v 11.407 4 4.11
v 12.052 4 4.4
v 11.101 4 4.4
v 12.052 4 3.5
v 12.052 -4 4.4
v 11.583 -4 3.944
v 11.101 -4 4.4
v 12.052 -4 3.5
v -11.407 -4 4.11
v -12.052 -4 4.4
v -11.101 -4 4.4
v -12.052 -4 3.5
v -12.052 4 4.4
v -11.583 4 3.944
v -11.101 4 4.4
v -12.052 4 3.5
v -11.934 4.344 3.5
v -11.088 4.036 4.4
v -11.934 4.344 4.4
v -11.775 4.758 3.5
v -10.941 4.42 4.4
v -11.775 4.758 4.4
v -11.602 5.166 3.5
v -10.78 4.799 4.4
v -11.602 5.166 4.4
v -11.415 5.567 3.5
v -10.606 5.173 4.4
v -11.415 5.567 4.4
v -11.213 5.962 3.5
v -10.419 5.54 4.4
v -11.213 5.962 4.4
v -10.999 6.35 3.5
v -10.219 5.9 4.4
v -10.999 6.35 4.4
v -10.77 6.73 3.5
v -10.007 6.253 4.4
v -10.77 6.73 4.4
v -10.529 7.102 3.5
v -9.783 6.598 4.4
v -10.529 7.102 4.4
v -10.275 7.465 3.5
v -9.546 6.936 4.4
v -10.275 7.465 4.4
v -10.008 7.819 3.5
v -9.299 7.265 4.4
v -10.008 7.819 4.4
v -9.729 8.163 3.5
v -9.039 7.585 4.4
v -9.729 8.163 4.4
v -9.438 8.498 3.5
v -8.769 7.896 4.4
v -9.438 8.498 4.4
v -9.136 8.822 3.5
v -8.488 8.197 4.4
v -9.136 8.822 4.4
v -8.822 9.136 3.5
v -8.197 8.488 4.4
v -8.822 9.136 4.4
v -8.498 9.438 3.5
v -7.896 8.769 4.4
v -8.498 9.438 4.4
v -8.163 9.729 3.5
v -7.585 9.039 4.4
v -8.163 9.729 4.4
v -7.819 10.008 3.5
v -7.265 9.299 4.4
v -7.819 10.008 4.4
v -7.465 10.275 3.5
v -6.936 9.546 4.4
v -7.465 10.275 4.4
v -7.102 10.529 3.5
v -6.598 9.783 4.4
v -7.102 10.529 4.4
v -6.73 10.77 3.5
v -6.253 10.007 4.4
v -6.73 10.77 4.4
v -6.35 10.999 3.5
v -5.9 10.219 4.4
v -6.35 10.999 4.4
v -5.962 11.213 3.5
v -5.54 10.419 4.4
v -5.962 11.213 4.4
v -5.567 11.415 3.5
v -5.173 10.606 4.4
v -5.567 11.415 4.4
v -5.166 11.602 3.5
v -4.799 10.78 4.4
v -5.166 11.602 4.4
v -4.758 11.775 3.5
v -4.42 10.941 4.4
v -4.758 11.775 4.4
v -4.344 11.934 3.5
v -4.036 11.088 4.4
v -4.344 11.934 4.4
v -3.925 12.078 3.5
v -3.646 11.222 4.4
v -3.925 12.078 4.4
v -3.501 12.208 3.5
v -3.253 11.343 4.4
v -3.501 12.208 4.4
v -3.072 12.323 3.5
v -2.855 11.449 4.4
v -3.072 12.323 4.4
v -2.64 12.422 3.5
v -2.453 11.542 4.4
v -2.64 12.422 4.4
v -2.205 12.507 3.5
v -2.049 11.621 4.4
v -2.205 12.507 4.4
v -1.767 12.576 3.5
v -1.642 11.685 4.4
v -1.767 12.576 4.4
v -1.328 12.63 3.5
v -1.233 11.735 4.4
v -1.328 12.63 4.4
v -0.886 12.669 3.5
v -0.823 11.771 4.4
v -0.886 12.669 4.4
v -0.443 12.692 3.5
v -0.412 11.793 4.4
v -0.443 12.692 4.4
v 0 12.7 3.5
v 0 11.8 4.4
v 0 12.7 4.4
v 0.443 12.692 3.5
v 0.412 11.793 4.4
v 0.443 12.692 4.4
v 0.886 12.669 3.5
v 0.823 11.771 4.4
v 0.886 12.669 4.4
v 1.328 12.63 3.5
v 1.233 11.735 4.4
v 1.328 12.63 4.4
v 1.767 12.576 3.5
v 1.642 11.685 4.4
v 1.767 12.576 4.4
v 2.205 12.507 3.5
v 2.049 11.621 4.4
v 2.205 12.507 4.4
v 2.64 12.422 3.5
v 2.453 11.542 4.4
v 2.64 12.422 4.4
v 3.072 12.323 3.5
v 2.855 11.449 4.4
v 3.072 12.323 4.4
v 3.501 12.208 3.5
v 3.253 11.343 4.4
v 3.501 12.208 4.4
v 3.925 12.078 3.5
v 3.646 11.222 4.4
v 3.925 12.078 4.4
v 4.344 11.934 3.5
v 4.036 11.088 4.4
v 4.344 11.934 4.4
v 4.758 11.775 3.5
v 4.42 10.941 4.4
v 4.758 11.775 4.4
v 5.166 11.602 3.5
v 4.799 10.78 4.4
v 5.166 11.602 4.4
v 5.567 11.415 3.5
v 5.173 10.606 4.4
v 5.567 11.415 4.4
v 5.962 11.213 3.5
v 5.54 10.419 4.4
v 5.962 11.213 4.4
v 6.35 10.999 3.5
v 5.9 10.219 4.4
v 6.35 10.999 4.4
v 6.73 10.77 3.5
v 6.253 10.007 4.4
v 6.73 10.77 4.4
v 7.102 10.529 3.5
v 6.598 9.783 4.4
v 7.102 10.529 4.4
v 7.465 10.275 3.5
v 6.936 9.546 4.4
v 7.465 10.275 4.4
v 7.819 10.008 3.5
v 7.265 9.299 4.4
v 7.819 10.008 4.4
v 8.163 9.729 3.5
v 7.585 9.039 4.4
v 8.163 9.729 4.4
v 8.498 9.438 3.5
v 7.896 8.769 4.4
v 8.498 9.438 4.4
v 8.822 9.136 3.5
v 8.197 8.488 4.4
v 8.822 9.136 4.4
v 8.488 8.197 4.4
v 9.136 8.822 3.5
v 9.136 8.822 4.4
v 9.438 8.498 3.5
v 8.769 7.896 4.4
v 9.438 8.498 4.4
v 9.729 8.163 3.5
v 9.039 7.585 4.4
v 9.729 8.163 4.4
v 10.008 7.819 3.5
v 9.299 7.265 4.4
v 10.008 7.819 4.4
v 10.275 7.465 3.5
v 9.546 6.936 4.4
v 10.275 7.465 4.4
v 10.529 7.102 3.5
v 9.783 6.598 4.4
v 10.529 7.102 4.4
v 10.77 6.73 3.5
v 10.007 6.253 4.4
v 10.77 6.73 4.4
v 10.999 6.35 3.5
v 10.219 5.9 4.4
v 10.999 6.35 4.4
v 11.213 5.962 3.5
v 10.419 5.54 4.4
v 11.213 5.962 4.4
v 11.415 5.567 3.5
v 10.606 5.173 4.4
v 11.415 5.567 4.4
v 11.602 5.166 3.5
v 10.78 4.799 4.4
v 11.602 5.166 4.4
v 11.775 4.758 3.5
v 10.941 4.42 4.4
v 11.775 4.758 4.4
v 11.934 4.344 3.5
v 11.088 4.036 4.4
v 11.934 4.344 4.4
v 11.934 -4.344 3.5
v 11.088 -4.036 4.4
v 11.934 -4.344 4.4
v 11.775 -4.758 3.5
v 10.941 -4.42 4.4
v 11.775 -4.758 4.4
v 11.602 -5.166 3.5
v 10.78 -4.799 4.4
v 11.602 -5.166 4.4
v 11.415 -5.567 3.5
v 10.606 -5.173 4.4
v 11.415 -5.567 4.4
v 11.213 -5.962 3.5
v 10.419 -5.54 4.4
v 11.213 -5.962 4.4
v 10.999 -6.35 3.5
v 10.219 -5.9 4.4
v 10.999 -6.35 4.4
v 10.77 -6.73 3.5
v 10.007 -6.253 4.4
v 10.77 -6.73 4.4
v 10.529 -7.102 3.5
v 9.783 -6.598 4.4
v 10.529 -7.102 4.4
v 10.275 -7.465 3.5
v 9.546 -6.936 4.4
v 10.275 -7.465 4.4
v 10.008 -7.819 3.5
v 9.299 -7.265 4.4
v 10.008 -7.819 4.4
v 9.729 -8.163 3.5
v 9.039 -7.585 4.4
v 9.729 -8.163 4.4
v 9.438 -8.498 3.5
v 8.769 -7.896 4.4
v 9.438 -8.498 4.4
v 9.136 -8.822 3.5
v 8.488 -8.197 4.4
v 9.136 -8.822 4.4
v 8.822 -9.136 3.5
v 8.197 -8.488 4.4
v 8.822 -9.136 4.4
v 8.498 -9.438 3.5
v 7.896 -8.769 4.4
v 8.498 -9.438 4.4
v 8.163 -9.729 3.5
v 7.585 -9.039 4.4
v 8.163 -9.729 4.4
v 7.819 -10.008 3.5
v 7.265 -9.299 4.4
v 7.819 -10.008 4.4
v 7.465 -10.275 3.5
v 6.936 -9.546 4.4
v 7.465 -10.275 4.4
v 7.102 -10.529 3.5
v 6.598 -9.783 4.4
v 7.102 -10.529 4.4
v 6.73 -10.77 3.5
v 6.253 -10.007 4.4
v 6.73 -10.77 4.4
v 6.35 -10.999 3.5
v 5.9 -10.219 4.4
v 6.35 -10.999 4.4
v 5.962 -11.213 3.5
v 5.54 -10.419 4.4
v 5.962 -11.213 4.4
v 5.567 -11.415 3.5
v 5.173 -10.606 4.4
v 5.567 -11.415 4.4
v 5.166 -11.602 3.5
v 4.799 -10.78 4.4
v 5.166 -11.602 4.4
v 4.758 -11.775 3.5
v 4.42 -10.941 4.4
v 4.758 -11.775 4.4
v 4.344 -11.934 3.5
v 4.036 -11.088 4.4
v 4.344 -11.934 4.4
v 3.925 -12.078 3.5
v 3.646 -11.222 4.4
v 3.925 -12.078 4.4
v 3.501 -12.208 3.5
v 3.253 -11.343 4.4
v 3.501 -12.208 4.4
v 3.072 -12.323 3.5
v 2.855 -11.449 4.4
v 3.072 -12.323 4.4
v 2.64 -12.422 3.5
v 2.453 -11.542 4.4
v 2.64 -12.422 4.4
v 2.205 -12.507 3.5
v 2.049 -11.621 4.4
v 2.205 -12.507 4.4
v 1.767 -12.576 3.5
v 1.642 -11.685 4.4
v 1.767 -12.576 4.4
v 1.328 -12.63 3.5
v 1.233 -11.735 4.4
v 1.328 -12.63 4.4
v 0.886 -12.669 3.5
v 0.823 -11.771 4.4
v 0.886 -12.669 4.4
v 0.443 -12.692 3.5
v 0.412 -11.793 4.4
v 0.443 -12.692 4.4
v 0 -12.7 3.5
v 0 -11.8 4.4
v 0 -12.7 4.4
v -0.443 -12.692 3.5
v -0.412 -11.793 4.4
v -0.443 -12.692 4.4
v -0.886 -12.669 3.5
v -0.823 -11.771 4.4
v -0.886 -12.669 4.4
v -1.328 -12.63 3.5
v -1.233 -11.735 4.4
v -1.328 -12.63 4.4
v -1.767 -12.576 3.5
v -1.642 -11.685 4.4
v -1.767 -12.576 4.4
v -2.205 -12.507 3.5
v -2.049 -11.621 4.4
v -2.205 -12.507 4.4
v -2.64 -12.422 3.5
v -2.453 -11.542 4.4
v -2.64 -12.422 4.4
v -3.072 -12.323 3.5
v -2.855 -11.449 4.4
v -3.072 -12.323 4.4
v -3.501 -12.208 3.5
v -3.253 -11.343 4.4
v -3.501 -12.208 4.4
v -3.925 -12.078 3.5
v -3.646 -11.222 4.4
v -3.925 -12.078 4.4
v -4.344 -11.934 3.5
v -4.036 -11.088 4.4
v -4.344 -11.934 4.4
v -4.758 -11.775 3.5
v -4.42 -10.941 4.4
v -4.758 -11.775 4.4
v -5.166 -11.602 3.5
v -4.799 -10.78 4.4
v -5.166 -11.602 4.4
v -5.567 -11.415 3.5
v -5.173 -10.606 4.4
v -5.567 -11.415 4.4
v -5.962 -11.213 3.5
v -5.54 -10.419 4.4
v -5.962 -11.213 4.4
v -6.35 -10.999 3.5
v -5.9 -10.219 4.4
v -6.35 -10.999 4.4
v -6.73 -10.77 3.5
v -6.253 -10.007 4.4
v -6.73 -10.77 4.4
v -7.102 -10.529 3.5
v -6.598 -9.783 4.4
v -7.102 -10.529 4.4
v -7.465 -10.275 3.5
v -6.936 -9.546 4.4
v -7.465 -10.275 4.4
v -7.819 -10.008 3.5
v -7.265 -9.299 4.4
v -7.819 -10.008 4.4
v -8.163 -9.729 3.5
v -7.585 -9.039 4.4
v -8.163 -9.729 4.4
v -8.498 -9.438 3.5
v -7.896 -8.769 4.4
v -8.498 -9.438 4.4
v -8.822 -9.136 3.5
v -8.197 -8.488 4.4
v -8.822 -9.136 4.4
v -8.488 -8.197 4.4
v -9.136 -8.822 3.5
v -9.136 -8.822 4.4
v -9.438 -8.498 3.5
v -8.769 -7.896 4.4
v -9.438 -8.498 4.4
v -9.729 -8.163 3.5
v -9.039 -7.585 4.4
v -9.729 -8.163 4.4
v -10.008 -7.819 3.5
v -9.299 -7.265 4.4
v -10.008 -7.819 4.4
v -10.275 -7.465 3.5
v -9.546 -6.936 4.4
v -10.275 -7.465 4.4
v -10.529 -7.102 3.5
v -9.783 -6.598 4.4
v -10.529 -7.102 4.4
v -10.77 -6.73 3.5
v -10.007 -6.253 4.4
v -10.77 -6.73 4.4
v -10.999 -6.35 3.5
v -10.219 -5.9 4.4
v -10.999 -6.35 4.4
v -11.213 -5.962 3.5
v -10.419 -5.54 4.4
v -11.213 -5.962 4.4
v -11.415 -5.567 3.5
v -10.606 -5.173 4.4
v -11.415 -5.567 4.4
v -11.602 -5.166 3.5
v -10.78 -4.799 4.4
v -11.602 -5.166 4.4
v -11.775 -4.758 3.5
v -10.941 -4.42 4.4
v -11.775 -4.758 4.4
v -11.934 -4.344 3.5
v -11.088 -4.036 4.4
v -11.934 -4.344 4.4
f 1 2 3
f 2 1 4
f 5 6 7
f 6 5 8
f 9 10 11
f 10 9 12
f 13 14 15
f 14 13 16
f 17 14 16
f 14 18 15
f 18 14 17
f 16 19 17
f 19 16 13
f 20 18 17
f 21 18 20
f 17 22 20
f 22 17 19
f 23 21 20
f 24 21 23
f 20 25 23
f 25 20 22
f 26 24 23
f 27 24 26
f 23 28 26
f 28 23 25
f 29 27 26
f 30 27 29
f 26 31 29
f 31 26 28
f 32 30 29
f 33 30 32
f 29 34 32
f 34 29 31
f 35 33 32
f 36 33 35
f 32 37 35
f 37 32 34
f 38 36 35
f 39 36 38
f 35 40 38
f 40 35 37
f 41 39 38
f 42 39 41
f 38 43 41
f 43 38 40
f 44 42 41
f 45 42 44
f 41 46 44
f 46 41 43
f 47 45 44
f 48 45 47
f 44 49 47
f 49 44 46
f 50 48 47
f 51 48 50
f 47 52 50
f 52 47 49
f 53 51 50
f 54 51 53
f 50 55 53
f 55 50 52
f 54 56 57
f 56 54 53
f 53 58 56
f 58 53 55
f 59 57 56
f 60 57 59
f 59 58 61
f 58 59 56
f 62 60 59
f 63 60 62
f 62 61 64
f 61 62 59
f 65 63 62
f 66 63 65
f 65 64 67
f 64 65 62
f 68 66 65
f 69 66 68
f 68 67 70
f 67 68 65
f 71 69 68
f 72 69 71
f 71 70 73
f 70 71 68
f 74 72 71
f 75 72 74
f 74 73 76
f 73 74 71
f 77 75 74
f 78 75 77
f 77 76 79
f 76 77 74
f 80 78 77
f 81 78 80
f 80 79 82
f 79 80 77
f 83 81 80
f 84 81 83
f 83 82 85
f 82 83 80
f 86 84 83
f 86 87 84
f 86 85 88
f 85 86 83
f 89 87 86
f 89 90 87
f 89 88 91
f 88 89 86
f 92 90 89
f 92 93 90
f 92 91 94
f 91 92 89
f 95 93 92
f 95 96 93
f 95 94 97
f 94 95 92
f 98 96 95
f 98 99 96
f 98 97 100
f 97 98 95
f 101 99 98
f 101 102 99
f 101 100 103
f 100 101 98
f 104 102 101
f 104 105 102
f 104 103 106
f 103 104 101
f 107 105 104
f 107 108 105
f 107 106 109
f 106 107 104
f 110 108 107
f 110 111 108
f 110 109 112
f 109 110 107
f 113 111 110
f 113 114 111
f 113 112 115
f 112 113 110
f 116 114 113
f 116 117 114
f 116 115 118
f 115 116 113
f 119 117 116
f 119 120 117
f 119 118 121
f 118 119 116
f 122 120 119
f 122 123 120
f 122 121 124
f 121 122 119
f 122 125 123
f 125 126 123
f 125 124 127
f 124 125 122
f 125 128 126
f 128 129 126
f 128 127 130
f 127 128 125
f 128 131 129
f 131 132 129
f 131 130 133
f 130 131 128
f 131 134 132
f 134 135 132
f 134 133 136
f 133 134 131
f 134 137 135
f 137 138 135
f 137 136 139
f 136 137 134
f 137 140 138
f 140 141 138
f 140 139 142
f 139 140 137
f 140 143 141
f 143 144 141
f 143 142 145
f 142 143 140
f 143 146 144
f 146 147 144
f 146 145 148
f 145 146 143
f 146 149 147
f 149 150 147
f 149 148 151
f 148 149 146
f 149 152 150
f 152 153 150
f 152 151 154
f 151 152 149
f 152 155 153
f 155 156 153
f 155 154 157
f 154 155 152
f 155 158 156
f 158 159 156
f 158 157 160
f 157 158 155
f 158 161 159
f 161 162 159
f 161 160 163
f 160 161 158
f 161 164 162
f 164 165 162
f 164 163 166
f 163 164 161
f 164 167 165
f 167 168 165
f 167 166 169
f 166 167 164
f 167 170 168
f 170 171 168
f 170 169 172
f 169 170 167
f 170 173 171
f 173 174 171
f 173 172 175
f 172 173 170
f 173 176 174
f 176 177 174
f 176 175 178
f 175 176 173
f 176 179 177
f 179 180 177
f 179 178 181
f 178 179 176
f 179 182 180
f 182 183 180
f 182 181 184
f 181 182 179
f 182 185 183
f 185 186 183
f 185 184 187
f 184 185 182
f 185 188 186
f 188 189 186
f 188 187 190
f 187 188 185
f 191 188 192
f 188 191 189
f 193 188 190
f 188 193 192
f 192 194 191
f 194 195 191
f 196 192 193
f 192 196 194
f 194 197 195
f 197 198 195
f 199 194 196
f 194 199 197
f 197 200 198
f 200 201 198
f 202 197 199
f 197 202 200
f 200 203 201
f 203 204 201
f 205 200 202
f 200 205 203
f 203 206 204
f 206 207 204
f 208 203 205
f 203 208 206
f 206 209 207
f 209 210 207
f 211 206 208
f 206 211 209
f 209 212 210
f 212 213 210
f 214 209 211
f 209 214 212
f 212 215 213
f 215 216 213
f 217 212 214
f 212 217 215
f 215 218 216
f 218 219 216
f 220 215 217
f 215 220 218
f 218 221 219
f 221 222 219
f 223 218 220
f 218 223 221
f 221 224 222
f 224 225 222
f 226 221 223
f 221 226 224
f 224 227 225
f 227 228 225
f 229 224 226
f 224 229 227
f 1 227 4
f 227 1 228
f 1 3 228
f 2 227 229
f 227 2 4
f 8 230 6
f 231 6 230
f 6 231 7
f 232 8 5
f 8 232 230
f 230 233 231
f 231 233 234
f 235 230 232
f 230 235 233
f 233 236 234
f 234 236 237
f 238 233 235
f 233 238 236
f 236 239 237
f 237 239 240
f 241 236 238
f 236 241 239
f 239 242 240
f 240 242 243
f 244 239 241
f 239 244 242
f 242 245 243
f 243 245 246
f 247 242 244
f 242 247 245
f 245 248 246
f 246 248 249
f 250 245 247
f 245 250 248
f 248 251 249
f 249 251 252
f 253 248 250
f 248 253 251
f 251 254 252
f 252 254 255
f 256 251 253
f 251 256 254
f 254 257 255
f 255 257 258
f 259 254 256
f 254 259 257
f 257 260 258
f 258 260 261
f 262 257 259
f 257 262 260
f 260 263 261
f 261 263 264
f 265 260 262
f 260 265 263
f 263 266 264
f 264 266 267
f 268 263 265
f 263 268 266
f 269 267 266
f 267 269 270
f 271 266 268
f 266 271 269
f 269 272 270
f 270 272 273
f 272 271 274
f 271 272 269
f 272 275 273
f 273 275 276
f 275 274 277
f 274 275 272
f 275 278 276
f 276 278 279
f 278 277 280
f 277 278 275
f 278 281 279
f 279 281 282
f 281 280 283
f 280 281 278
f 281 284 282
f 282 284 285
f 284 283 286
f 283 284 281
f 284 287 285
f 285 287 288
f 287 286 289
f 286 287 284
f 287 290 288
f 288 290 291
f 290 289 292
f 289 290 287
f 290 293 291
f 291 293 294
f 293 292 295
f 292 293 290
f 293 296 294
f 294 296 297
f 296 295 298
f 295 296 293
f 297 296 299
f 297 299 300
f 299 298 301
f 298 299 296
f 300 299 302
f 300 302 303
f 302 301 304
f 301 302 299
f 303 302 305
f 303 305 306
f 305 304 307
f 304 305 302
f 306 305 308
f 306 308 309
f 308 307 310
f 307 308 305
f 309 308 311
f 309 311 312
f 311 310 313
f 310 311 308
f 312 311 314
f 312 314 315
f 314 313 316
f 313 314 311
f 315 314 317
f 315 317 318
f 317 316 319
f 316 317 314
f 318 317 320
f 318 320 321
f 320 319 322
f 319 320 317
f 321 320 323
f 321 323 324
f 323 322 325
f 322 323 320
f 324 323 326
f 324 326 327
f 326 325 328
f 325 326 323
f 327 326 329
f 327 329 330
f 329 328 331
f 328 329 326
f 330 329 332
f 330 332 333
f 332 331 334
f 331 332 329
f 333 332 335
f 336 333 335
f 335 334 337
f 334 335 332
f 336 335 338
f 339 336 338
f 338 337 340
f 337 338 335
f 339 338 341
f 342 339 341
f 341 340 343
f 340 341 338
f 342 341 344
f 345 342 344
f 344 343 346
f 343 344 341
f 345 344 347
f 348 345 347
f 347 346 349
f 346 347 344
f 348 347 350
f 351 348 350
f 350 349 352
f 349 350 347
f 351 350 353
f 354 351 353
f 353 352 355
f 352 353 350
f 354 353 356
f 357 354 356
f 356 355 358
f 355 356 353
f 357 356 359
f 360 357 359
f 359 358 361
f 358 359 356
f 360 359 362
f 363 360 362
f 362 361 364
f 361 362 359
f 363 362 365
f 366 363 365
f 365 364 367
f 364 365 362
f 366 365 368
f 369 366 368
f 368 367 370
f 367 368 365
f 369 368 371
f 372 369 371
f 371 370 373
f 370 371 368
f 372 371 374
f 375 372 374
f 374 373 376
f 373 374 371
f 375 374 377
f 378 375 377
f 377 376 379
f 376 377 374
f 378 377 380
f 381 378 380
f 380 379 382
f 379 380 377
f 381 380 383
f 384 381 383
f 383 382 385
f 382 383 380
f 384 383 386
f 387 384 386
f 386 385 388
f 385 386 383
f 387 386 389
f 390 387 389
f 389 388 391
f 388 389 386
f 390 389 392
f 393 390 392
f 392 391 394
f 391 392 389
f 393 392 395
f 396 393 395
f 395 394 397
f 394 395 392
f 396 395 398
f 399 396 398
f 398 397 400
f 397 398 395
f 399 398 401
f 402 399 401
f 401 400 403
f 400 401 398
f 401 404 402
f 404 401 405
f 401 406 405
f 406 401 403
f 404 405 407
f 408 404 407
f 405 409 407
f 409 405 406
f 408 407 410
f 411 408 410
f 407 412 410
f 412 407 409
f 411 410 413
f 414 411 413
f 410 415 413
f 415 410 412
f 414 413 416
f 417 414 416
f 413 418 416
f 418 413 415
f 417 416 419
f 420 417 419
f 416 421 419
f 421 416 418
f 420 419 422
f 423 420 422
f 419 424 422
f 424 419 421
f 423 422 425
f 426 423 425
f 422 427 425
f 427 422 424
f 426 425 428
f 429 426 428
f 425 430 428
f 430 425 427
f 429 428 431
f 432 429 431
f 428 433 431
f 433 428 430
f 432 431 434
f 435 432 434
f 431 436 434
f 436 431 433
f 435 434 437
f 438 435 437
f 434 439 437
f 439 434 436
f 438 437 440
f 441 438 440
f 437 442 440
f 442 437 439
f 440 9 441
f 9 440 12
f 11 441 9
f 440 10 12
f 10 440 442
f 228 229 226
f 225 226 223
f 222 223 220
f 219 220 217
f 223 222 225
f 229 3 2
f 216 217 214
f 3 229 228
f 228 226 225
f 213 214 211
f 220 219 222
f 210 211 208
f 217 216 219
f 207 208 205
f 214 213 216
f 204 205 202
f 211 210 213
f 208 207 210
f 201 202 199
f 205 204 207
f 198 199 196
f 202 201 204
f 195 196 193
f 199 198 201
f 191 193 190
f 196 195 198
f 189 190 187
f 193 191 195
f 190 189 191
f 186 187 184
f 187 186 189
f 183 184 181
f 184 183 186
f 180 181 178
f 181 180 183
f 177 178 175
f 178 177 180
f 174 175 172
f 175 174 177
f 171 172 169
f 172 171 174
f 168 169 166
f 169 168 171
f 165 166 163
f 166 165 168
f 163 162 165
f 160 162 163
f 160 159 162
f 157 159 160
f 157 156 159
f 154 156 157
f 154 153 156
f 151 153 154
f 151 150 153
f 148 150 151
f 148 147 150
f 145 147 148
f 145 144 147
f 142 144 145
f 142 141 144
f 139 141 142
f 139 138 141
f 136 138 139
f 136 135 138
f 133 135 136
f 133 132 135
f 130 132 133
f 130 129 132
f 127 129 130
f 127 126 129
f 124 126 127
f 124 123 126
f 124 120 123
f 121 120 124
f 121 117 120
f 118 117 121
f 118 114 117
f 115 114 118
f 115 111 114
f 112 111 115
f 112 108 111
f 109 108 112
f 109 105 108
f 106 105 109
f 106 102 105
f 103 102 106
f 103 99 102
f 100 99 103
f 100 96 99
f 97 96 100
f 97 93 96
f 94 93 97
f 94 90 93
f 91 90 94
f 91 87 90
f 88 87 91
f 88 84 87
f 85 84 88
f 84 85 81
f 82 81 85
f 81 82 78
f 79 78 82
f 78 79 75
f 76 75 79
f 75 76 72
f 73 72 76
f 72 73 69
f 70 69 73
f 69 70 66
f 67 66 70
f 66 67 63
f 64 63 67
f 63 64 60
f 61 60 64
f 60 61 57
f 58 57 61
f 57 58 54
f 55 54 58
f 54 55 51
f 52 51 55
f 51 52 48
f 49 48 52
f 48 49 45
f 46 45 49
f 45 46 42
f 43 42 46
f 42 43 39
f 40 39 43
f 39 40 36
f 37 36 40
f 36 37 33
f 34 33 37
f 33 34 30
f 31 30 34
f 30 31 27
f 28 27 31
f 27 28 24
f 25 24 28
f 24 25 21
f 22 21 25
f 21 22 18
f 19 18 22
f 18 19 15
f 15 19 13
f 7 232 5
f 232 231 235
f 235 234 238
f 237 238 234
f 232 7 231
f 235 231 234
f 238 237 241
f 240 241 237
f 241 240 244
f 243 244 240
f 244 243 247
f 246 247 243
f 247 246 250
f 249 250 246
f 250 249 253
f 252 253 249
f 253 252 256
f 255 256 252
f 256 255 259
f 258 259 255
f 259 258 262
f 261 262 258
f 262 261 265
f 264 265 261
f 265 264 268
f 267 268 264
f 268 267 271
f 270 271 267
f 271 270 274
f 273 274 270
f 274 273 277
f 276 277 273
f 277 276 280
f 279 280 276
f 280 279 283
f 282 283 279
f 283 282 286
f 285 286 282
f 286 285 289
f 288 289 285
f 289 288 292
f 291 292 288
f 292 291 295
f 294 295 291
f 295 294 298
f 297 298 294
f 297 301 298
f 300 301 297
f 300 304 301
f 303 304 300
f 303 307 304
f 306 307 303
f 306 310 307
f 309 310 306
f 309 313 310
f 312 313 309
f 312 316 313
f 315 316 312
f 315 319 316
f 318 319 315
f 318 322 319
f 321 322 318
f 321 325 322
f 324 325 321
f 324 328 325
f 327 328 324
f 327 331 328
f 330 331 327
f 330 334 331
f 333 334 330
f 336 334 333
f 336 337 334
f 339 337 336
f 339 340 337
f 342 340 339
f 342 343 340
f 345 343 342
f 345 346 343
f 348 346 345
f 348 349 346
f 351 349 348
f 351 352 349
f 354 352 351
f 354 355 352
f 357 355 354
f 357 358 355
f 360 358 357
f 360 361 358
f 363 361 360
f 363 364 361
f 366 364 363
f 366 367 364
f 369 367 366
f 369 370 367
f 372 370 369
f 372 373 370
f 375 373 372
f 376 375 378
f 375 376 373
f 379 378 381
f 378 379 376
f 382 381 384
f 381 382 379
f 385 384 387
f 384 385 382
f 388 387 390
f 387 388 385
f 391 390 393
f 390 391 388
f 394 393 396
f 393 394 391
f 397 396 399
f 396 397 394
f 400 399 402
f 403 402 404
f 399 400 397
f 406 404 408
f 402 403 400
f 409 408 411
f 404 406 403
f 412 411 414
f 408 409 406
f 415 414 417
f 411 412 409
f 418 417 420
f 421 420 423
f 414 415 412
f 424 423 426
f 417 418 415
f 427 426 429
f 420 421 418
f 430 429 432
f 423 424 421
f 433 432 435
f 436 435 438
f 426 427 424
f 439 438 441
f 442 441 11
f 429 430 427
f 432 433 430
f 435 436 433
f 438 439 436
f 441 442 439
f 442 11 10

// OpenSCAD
// file: dim.scad
MM_TO_INCHES = 1 / 25.4;
INCHES_TO_MM = 25.4;

D_FORWARD			= 1.00 * INCHES_TO_MM;
D_AFT				= 31.4;
R_FORWARD 			= D_FORWARD / 2;
R_AFT 				= D_AFT / 2;
D_SABER_OUTER		= 37.5;

D_PORT_SCREW		= 0.5 * INCHES_TO_MM;
R_PORT_SCREW 		= D_PORT_SCREW / 2;

FACES 				= 90;
// file: ../shapes.scad
FACES   = 180;
EPSILON = 0.1;
PIN	    = 2.54;


module tube(_h, _rInner, _rOuter) {
	difference() {
		cylinder(h=_h, r=_rOuter, $fn=FACES);
		translate([0,0,-EPSILON]) {
			cylinder(h=_h + EPSILON*2, r=_rInner, $fn=FACES);
		}
	}
}

module shelf(_r0, _h, _r1) {
	rotate_extrude($fn=FACES) {
		polygon([[_r0, 0], [_r1, _h], [_r0, _h]]);
	}
}


module pinsAtTube(r, h, nX, nY, longY)
{
	OFFSET = sqrt(r * r - PIN * PIN * nX * nX / 4);

	Y = longY ? 40 : PIN * nY;

    translate([-nX * PIN / 2, OFFSET - PIN * nY, 0]) {
        cube([nX * PIN, Y, h]);
    }	
}
// main file
use <../threads.scad>
use <../shapes.scad>
include <dim.scad>

/*
	3 sections:
	TUBE_COUPLE
	SPKR_METAL
	SPKR_PLASTIC
*/

TUBE_COUPLE_H  = 3.5;
TUBE_COUPLE_D  = 25.4;
SPKR_METAL_H   = 8;
SPKR_METAL_D   = 23.6;	
SPKR_PLASTIC_H = 2.7;
SPKR_PLASTIC_D = 28;
TRAN     	   = (TUBE_COUPLE_D - SPKR_METAL_D)/2;

//intersection()
{
	difference() 
	{
		union() {
			tube(TUBE_COUPLE_H + TRAN, D_AFT/2, TUBE_COUPLE_D/2);
			translate([0, 0, TUBE_COUPLE_H]) {
				shelf(TUBE_COUPLE_D	/2, TRAN, SPKR_METAL_D/2);
				translate([0, 0, TRAN]) {
					tube(SPKR_METAL_H - TRAN, D_AFT/2, SPKR_METAL_D/2);
					translate([0, 0, SPKR_METAL_H - TRAN]) {
						tube(SPKR_PLASTIC_H, D_AFT/2, SPKR_PLASTIC_D/2);
					}
				}
			}
		}
		for(r=[0:1]) {
            S = 8;
            S2 = 4;
			rotate([0,0,r*180]) {
				translate([D_AFT/2 - S, -S/2, TUBE_COUPLE_H + 2]) {
					cube(size=[S+1, S, 20], center=false);
				}
                translate([TUBE_COUPLE_D/2 - S2, -S/2, -0.1]) {
                    cube(size=[4, S, 20]);
                }
			}
		}
	}
//	cube(size=[100,100,100]);
}
